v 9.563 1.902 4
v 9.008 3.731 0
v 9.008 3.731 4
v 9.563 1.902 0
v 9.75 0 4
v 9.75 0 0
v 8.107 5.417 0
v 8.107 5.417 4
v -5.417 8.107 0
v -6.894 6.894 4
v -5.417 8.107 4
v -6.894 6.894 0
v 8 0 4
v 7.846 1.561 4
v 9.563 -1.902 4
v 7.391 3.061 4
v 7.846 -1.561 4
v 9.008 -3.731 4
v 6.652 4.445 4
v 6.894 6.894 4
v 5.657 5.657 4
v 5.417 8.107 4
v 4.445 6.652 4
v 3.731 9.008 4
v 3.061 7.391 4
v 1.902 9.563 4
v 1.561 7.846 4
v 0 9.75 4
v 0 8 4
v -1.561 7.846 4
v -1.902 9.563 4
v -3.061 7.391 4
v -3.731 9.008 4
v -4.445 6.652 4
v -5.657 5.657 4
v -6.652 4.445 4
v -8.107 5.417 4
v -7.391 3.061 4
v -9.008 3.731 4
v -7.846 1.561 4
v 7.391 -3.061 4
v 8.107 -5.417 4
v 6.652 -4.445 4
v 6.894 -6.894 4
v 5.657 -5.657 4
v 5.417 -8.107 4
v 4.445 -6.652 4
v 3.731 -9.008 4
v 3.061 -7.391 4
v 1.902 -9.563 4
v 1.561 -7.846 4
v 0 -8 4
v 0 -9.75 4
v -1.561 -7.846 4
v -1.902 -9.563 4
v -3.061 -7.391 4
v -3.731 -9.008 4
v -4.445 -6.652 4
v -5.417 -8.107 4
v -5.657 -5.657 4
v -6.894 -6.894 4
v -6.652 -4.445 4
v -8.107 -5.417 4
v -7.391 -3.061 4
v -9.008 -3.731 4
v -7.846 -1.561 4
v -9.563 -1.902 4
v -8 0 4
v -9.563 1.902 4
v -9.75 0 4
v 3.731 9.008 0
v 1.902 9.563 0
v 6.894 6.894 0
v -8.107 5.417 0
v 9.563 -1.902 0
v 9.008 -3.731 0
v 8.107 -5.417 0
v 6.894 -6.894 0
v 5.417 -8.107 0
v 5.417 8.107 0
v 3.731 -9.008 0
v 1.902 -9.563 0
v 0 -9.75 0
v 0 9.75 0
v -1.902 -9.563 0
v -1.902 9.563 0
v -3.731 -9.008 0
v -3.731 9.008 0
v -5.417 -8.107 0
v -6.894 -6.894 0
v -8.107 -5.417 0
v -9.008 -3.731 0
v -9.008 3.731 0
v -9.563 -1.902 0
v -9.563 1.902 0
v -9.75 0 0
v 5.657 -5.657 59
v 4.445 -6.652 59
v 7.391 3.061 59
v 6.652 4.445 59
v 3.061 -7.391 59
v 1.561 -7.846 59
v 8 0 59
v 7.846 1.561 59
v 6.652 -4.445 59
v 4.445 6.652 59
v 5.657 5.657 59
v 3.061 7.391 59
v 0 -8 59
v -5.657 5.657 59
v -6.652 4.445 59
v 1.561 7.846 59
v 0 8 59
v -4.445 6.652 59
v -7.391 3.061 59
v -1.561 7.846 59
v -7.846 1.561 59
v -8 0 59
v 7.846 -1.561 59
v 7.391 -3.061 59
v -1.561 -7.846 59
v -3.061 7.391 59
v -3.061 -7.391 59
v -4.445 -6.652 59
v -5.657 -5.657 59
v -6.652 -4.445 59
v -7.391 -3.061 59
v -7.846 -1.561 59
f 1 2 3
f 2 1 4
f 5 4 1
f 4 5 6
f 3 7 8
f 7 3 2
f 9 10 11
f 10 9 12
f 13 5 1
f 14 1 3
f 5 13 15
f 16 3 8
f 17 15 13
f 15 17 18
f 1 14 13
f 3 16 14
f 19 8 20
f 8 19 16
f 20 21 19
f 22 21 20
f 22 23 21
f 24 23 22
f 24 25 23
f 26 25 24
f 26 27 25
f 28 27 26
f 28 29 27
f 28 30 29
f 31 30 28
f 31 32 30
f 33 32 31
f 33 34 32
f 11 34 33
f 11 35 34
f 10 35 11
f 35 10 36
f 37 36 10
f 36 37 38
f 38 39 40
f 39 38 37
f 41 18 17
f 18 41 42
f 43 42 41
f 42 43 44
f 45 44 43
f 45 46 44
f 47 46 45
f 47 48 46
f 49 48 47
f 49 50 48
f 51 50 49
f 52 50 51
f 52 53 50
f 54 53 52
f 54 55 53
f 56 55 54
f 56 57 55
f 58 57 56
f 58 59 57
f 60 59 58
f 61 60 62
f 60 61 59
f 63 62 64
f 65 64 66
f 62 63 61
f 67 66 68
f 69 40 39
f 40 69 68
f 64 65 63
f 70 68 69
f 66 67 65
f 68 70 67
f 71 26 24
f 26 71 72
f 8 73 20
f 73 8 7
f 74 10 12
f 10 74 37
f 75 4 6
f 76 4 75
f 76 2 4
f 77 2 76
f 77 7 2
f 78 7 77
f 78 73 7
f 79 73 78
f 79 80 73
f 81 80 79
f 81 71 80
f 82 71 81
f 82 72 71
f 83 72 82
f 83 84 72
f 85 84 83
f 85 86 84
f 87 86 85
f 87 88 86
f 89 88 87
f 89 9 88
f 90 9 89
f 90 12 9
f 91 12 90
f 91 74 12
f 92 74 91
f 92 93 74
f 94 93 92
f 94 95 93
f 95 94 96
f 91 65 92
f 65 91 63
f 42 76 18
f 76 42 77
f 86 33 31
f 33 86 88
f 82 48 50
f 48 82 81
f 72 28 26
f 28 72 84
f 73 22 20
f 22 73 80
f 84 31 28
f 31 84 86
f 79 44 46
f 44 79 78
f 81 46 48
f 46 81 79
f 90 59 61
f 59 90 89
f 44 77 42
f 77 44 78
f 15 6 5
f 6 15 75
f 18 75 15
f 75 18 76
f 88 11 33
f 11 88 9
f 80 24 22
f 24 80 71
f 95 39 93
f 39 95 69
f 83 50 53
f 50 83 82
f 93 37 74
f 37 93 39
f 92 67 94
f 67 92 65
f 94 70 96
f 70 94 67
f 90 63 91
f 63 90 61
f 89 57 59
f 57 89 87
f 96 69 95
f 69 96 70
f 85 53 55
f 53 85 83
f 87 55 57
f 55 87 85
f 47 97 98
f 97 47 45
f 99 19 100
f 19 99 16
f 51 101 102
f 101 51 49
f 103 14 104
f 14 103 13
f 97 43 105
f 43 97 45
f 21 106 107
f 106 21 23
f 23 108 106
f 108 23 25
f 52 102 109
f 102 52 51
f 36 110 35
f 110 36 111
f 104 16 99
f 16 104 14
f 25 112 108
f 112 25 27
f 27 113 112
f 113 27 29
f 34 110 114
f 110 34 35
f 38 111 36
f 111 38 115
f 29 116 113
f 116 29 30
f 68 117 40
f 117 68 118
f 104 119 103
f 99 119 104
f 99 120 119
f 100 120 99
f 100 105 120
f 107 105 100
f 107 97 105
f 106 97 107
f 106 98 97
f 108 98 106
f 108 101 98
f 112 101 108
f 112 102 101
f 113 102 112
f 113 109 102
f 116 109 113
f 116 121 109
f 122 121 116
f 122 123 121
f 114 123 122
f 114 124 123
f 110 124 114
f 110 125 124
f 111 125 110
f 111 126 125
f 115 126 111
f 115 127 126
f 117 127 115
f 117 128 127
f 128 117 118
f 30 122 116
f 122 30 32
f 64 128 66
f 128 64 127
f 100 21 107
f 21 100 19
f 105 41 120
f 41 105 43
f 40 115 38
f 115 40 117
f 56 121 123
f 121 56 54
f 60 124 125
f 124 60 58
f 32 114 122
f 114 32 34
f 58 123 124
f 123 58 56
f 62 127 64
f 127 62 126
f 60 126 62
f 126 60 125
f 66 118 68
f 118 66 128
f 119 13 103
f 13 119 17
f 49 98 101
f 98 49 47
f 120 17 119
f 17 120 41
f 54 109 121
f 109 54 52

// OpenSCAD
//
// ============================================================================
// SteamMachine UM790
// Project Phoenix
//
// Archivo  : pushbutton.scad
// Versión  : 1.0
// Fecha    : 2026-08-03
//
// Volumen mecánico de referencia del pulsador M16 x 55 mm para el
// ensamblaje virtual v1.
//
// NO ES UNA PIEZA IMPRIMIBLE.
//
// Sistema de coordenadas LOCAL de este módulo:
//   Origen (0,0,0) = centro del embellecedor, cara frontal (la que
//                     queda visible en el panel).
//   +Z = hacia el interior del chasis (rosca + cuerpo del mecanismo).
//        Se usa +Z, no +Y, para que el cilindro se extruya de forma
//        natural; el ensamblaje (virtual_assembly_v1.scad) rota este
//        módulo 90º sobre X al montarlo en el panel frontal.
//
// pushbutton_total_length (55 mm) es el dato real proporcionado para
// este componente y se modela aquí como cuerpo rígido completo, sin
// suponer una parte flexible de cableado. La comprobación de
// colisiones de virtual_assembly_v1.scad puede por tanto detectar
// una interferencia real con la PCB del UM790 si la posición de
// montaje no deja 55 mm libres detrás del panel; ver
// docs/03_Virtual_Assembly_Report.md.
//
// ============================================================================

include <../../../00_parametros.scad>;

$fn = 32;

part_version = "1.0";


//=============================================================================
// COLORES
//=============================================================================

pushbuttonCapColor    = [0.85,0.05,0.05,1.0];
pushbuttonBodyColor   = [0.60,0.60,0.60,1.0];


//=============================================================================
// EMBELLECEDOR VISIBLE
//=============================================================================

module pushbuttonCap(capThickness = 4)
{

    color(pushbuttonCapColor)

        cylinder(
            d = pushbutton_cap_diameter,
            h = capThickness
        );

}


//=============================================================================
// ROSCA + CUERPO DEL MECANISMO (longitud total real: 55 mm)
//=============================================================================

module pushbuttonBody(capThickness = 4)
{

    color(pushbuttonBodyColor)

    translate([0,0,capThickness])

        cylinder(
            d = pushbutton_thread_diameter,
            h = pushbutton_total_length
        );

}


//=============================================================================
// CUERPO MECÁNICO COMPLETO (para comprobación de colisiones "duras")
//=============================================================================

module pushbuttonFull()
{

    union()
    {
        pushbuttonCap();
        pushbuttonBody();
    }

}


//=============================================================================
// CONJUNTO COMPLETO (visualización)
//=============================================================================

module pushbutton()
{

    pushbuttonFull();

}


//=============================================================================
// PREVIEW
//=============================================================================

pushbutton();
